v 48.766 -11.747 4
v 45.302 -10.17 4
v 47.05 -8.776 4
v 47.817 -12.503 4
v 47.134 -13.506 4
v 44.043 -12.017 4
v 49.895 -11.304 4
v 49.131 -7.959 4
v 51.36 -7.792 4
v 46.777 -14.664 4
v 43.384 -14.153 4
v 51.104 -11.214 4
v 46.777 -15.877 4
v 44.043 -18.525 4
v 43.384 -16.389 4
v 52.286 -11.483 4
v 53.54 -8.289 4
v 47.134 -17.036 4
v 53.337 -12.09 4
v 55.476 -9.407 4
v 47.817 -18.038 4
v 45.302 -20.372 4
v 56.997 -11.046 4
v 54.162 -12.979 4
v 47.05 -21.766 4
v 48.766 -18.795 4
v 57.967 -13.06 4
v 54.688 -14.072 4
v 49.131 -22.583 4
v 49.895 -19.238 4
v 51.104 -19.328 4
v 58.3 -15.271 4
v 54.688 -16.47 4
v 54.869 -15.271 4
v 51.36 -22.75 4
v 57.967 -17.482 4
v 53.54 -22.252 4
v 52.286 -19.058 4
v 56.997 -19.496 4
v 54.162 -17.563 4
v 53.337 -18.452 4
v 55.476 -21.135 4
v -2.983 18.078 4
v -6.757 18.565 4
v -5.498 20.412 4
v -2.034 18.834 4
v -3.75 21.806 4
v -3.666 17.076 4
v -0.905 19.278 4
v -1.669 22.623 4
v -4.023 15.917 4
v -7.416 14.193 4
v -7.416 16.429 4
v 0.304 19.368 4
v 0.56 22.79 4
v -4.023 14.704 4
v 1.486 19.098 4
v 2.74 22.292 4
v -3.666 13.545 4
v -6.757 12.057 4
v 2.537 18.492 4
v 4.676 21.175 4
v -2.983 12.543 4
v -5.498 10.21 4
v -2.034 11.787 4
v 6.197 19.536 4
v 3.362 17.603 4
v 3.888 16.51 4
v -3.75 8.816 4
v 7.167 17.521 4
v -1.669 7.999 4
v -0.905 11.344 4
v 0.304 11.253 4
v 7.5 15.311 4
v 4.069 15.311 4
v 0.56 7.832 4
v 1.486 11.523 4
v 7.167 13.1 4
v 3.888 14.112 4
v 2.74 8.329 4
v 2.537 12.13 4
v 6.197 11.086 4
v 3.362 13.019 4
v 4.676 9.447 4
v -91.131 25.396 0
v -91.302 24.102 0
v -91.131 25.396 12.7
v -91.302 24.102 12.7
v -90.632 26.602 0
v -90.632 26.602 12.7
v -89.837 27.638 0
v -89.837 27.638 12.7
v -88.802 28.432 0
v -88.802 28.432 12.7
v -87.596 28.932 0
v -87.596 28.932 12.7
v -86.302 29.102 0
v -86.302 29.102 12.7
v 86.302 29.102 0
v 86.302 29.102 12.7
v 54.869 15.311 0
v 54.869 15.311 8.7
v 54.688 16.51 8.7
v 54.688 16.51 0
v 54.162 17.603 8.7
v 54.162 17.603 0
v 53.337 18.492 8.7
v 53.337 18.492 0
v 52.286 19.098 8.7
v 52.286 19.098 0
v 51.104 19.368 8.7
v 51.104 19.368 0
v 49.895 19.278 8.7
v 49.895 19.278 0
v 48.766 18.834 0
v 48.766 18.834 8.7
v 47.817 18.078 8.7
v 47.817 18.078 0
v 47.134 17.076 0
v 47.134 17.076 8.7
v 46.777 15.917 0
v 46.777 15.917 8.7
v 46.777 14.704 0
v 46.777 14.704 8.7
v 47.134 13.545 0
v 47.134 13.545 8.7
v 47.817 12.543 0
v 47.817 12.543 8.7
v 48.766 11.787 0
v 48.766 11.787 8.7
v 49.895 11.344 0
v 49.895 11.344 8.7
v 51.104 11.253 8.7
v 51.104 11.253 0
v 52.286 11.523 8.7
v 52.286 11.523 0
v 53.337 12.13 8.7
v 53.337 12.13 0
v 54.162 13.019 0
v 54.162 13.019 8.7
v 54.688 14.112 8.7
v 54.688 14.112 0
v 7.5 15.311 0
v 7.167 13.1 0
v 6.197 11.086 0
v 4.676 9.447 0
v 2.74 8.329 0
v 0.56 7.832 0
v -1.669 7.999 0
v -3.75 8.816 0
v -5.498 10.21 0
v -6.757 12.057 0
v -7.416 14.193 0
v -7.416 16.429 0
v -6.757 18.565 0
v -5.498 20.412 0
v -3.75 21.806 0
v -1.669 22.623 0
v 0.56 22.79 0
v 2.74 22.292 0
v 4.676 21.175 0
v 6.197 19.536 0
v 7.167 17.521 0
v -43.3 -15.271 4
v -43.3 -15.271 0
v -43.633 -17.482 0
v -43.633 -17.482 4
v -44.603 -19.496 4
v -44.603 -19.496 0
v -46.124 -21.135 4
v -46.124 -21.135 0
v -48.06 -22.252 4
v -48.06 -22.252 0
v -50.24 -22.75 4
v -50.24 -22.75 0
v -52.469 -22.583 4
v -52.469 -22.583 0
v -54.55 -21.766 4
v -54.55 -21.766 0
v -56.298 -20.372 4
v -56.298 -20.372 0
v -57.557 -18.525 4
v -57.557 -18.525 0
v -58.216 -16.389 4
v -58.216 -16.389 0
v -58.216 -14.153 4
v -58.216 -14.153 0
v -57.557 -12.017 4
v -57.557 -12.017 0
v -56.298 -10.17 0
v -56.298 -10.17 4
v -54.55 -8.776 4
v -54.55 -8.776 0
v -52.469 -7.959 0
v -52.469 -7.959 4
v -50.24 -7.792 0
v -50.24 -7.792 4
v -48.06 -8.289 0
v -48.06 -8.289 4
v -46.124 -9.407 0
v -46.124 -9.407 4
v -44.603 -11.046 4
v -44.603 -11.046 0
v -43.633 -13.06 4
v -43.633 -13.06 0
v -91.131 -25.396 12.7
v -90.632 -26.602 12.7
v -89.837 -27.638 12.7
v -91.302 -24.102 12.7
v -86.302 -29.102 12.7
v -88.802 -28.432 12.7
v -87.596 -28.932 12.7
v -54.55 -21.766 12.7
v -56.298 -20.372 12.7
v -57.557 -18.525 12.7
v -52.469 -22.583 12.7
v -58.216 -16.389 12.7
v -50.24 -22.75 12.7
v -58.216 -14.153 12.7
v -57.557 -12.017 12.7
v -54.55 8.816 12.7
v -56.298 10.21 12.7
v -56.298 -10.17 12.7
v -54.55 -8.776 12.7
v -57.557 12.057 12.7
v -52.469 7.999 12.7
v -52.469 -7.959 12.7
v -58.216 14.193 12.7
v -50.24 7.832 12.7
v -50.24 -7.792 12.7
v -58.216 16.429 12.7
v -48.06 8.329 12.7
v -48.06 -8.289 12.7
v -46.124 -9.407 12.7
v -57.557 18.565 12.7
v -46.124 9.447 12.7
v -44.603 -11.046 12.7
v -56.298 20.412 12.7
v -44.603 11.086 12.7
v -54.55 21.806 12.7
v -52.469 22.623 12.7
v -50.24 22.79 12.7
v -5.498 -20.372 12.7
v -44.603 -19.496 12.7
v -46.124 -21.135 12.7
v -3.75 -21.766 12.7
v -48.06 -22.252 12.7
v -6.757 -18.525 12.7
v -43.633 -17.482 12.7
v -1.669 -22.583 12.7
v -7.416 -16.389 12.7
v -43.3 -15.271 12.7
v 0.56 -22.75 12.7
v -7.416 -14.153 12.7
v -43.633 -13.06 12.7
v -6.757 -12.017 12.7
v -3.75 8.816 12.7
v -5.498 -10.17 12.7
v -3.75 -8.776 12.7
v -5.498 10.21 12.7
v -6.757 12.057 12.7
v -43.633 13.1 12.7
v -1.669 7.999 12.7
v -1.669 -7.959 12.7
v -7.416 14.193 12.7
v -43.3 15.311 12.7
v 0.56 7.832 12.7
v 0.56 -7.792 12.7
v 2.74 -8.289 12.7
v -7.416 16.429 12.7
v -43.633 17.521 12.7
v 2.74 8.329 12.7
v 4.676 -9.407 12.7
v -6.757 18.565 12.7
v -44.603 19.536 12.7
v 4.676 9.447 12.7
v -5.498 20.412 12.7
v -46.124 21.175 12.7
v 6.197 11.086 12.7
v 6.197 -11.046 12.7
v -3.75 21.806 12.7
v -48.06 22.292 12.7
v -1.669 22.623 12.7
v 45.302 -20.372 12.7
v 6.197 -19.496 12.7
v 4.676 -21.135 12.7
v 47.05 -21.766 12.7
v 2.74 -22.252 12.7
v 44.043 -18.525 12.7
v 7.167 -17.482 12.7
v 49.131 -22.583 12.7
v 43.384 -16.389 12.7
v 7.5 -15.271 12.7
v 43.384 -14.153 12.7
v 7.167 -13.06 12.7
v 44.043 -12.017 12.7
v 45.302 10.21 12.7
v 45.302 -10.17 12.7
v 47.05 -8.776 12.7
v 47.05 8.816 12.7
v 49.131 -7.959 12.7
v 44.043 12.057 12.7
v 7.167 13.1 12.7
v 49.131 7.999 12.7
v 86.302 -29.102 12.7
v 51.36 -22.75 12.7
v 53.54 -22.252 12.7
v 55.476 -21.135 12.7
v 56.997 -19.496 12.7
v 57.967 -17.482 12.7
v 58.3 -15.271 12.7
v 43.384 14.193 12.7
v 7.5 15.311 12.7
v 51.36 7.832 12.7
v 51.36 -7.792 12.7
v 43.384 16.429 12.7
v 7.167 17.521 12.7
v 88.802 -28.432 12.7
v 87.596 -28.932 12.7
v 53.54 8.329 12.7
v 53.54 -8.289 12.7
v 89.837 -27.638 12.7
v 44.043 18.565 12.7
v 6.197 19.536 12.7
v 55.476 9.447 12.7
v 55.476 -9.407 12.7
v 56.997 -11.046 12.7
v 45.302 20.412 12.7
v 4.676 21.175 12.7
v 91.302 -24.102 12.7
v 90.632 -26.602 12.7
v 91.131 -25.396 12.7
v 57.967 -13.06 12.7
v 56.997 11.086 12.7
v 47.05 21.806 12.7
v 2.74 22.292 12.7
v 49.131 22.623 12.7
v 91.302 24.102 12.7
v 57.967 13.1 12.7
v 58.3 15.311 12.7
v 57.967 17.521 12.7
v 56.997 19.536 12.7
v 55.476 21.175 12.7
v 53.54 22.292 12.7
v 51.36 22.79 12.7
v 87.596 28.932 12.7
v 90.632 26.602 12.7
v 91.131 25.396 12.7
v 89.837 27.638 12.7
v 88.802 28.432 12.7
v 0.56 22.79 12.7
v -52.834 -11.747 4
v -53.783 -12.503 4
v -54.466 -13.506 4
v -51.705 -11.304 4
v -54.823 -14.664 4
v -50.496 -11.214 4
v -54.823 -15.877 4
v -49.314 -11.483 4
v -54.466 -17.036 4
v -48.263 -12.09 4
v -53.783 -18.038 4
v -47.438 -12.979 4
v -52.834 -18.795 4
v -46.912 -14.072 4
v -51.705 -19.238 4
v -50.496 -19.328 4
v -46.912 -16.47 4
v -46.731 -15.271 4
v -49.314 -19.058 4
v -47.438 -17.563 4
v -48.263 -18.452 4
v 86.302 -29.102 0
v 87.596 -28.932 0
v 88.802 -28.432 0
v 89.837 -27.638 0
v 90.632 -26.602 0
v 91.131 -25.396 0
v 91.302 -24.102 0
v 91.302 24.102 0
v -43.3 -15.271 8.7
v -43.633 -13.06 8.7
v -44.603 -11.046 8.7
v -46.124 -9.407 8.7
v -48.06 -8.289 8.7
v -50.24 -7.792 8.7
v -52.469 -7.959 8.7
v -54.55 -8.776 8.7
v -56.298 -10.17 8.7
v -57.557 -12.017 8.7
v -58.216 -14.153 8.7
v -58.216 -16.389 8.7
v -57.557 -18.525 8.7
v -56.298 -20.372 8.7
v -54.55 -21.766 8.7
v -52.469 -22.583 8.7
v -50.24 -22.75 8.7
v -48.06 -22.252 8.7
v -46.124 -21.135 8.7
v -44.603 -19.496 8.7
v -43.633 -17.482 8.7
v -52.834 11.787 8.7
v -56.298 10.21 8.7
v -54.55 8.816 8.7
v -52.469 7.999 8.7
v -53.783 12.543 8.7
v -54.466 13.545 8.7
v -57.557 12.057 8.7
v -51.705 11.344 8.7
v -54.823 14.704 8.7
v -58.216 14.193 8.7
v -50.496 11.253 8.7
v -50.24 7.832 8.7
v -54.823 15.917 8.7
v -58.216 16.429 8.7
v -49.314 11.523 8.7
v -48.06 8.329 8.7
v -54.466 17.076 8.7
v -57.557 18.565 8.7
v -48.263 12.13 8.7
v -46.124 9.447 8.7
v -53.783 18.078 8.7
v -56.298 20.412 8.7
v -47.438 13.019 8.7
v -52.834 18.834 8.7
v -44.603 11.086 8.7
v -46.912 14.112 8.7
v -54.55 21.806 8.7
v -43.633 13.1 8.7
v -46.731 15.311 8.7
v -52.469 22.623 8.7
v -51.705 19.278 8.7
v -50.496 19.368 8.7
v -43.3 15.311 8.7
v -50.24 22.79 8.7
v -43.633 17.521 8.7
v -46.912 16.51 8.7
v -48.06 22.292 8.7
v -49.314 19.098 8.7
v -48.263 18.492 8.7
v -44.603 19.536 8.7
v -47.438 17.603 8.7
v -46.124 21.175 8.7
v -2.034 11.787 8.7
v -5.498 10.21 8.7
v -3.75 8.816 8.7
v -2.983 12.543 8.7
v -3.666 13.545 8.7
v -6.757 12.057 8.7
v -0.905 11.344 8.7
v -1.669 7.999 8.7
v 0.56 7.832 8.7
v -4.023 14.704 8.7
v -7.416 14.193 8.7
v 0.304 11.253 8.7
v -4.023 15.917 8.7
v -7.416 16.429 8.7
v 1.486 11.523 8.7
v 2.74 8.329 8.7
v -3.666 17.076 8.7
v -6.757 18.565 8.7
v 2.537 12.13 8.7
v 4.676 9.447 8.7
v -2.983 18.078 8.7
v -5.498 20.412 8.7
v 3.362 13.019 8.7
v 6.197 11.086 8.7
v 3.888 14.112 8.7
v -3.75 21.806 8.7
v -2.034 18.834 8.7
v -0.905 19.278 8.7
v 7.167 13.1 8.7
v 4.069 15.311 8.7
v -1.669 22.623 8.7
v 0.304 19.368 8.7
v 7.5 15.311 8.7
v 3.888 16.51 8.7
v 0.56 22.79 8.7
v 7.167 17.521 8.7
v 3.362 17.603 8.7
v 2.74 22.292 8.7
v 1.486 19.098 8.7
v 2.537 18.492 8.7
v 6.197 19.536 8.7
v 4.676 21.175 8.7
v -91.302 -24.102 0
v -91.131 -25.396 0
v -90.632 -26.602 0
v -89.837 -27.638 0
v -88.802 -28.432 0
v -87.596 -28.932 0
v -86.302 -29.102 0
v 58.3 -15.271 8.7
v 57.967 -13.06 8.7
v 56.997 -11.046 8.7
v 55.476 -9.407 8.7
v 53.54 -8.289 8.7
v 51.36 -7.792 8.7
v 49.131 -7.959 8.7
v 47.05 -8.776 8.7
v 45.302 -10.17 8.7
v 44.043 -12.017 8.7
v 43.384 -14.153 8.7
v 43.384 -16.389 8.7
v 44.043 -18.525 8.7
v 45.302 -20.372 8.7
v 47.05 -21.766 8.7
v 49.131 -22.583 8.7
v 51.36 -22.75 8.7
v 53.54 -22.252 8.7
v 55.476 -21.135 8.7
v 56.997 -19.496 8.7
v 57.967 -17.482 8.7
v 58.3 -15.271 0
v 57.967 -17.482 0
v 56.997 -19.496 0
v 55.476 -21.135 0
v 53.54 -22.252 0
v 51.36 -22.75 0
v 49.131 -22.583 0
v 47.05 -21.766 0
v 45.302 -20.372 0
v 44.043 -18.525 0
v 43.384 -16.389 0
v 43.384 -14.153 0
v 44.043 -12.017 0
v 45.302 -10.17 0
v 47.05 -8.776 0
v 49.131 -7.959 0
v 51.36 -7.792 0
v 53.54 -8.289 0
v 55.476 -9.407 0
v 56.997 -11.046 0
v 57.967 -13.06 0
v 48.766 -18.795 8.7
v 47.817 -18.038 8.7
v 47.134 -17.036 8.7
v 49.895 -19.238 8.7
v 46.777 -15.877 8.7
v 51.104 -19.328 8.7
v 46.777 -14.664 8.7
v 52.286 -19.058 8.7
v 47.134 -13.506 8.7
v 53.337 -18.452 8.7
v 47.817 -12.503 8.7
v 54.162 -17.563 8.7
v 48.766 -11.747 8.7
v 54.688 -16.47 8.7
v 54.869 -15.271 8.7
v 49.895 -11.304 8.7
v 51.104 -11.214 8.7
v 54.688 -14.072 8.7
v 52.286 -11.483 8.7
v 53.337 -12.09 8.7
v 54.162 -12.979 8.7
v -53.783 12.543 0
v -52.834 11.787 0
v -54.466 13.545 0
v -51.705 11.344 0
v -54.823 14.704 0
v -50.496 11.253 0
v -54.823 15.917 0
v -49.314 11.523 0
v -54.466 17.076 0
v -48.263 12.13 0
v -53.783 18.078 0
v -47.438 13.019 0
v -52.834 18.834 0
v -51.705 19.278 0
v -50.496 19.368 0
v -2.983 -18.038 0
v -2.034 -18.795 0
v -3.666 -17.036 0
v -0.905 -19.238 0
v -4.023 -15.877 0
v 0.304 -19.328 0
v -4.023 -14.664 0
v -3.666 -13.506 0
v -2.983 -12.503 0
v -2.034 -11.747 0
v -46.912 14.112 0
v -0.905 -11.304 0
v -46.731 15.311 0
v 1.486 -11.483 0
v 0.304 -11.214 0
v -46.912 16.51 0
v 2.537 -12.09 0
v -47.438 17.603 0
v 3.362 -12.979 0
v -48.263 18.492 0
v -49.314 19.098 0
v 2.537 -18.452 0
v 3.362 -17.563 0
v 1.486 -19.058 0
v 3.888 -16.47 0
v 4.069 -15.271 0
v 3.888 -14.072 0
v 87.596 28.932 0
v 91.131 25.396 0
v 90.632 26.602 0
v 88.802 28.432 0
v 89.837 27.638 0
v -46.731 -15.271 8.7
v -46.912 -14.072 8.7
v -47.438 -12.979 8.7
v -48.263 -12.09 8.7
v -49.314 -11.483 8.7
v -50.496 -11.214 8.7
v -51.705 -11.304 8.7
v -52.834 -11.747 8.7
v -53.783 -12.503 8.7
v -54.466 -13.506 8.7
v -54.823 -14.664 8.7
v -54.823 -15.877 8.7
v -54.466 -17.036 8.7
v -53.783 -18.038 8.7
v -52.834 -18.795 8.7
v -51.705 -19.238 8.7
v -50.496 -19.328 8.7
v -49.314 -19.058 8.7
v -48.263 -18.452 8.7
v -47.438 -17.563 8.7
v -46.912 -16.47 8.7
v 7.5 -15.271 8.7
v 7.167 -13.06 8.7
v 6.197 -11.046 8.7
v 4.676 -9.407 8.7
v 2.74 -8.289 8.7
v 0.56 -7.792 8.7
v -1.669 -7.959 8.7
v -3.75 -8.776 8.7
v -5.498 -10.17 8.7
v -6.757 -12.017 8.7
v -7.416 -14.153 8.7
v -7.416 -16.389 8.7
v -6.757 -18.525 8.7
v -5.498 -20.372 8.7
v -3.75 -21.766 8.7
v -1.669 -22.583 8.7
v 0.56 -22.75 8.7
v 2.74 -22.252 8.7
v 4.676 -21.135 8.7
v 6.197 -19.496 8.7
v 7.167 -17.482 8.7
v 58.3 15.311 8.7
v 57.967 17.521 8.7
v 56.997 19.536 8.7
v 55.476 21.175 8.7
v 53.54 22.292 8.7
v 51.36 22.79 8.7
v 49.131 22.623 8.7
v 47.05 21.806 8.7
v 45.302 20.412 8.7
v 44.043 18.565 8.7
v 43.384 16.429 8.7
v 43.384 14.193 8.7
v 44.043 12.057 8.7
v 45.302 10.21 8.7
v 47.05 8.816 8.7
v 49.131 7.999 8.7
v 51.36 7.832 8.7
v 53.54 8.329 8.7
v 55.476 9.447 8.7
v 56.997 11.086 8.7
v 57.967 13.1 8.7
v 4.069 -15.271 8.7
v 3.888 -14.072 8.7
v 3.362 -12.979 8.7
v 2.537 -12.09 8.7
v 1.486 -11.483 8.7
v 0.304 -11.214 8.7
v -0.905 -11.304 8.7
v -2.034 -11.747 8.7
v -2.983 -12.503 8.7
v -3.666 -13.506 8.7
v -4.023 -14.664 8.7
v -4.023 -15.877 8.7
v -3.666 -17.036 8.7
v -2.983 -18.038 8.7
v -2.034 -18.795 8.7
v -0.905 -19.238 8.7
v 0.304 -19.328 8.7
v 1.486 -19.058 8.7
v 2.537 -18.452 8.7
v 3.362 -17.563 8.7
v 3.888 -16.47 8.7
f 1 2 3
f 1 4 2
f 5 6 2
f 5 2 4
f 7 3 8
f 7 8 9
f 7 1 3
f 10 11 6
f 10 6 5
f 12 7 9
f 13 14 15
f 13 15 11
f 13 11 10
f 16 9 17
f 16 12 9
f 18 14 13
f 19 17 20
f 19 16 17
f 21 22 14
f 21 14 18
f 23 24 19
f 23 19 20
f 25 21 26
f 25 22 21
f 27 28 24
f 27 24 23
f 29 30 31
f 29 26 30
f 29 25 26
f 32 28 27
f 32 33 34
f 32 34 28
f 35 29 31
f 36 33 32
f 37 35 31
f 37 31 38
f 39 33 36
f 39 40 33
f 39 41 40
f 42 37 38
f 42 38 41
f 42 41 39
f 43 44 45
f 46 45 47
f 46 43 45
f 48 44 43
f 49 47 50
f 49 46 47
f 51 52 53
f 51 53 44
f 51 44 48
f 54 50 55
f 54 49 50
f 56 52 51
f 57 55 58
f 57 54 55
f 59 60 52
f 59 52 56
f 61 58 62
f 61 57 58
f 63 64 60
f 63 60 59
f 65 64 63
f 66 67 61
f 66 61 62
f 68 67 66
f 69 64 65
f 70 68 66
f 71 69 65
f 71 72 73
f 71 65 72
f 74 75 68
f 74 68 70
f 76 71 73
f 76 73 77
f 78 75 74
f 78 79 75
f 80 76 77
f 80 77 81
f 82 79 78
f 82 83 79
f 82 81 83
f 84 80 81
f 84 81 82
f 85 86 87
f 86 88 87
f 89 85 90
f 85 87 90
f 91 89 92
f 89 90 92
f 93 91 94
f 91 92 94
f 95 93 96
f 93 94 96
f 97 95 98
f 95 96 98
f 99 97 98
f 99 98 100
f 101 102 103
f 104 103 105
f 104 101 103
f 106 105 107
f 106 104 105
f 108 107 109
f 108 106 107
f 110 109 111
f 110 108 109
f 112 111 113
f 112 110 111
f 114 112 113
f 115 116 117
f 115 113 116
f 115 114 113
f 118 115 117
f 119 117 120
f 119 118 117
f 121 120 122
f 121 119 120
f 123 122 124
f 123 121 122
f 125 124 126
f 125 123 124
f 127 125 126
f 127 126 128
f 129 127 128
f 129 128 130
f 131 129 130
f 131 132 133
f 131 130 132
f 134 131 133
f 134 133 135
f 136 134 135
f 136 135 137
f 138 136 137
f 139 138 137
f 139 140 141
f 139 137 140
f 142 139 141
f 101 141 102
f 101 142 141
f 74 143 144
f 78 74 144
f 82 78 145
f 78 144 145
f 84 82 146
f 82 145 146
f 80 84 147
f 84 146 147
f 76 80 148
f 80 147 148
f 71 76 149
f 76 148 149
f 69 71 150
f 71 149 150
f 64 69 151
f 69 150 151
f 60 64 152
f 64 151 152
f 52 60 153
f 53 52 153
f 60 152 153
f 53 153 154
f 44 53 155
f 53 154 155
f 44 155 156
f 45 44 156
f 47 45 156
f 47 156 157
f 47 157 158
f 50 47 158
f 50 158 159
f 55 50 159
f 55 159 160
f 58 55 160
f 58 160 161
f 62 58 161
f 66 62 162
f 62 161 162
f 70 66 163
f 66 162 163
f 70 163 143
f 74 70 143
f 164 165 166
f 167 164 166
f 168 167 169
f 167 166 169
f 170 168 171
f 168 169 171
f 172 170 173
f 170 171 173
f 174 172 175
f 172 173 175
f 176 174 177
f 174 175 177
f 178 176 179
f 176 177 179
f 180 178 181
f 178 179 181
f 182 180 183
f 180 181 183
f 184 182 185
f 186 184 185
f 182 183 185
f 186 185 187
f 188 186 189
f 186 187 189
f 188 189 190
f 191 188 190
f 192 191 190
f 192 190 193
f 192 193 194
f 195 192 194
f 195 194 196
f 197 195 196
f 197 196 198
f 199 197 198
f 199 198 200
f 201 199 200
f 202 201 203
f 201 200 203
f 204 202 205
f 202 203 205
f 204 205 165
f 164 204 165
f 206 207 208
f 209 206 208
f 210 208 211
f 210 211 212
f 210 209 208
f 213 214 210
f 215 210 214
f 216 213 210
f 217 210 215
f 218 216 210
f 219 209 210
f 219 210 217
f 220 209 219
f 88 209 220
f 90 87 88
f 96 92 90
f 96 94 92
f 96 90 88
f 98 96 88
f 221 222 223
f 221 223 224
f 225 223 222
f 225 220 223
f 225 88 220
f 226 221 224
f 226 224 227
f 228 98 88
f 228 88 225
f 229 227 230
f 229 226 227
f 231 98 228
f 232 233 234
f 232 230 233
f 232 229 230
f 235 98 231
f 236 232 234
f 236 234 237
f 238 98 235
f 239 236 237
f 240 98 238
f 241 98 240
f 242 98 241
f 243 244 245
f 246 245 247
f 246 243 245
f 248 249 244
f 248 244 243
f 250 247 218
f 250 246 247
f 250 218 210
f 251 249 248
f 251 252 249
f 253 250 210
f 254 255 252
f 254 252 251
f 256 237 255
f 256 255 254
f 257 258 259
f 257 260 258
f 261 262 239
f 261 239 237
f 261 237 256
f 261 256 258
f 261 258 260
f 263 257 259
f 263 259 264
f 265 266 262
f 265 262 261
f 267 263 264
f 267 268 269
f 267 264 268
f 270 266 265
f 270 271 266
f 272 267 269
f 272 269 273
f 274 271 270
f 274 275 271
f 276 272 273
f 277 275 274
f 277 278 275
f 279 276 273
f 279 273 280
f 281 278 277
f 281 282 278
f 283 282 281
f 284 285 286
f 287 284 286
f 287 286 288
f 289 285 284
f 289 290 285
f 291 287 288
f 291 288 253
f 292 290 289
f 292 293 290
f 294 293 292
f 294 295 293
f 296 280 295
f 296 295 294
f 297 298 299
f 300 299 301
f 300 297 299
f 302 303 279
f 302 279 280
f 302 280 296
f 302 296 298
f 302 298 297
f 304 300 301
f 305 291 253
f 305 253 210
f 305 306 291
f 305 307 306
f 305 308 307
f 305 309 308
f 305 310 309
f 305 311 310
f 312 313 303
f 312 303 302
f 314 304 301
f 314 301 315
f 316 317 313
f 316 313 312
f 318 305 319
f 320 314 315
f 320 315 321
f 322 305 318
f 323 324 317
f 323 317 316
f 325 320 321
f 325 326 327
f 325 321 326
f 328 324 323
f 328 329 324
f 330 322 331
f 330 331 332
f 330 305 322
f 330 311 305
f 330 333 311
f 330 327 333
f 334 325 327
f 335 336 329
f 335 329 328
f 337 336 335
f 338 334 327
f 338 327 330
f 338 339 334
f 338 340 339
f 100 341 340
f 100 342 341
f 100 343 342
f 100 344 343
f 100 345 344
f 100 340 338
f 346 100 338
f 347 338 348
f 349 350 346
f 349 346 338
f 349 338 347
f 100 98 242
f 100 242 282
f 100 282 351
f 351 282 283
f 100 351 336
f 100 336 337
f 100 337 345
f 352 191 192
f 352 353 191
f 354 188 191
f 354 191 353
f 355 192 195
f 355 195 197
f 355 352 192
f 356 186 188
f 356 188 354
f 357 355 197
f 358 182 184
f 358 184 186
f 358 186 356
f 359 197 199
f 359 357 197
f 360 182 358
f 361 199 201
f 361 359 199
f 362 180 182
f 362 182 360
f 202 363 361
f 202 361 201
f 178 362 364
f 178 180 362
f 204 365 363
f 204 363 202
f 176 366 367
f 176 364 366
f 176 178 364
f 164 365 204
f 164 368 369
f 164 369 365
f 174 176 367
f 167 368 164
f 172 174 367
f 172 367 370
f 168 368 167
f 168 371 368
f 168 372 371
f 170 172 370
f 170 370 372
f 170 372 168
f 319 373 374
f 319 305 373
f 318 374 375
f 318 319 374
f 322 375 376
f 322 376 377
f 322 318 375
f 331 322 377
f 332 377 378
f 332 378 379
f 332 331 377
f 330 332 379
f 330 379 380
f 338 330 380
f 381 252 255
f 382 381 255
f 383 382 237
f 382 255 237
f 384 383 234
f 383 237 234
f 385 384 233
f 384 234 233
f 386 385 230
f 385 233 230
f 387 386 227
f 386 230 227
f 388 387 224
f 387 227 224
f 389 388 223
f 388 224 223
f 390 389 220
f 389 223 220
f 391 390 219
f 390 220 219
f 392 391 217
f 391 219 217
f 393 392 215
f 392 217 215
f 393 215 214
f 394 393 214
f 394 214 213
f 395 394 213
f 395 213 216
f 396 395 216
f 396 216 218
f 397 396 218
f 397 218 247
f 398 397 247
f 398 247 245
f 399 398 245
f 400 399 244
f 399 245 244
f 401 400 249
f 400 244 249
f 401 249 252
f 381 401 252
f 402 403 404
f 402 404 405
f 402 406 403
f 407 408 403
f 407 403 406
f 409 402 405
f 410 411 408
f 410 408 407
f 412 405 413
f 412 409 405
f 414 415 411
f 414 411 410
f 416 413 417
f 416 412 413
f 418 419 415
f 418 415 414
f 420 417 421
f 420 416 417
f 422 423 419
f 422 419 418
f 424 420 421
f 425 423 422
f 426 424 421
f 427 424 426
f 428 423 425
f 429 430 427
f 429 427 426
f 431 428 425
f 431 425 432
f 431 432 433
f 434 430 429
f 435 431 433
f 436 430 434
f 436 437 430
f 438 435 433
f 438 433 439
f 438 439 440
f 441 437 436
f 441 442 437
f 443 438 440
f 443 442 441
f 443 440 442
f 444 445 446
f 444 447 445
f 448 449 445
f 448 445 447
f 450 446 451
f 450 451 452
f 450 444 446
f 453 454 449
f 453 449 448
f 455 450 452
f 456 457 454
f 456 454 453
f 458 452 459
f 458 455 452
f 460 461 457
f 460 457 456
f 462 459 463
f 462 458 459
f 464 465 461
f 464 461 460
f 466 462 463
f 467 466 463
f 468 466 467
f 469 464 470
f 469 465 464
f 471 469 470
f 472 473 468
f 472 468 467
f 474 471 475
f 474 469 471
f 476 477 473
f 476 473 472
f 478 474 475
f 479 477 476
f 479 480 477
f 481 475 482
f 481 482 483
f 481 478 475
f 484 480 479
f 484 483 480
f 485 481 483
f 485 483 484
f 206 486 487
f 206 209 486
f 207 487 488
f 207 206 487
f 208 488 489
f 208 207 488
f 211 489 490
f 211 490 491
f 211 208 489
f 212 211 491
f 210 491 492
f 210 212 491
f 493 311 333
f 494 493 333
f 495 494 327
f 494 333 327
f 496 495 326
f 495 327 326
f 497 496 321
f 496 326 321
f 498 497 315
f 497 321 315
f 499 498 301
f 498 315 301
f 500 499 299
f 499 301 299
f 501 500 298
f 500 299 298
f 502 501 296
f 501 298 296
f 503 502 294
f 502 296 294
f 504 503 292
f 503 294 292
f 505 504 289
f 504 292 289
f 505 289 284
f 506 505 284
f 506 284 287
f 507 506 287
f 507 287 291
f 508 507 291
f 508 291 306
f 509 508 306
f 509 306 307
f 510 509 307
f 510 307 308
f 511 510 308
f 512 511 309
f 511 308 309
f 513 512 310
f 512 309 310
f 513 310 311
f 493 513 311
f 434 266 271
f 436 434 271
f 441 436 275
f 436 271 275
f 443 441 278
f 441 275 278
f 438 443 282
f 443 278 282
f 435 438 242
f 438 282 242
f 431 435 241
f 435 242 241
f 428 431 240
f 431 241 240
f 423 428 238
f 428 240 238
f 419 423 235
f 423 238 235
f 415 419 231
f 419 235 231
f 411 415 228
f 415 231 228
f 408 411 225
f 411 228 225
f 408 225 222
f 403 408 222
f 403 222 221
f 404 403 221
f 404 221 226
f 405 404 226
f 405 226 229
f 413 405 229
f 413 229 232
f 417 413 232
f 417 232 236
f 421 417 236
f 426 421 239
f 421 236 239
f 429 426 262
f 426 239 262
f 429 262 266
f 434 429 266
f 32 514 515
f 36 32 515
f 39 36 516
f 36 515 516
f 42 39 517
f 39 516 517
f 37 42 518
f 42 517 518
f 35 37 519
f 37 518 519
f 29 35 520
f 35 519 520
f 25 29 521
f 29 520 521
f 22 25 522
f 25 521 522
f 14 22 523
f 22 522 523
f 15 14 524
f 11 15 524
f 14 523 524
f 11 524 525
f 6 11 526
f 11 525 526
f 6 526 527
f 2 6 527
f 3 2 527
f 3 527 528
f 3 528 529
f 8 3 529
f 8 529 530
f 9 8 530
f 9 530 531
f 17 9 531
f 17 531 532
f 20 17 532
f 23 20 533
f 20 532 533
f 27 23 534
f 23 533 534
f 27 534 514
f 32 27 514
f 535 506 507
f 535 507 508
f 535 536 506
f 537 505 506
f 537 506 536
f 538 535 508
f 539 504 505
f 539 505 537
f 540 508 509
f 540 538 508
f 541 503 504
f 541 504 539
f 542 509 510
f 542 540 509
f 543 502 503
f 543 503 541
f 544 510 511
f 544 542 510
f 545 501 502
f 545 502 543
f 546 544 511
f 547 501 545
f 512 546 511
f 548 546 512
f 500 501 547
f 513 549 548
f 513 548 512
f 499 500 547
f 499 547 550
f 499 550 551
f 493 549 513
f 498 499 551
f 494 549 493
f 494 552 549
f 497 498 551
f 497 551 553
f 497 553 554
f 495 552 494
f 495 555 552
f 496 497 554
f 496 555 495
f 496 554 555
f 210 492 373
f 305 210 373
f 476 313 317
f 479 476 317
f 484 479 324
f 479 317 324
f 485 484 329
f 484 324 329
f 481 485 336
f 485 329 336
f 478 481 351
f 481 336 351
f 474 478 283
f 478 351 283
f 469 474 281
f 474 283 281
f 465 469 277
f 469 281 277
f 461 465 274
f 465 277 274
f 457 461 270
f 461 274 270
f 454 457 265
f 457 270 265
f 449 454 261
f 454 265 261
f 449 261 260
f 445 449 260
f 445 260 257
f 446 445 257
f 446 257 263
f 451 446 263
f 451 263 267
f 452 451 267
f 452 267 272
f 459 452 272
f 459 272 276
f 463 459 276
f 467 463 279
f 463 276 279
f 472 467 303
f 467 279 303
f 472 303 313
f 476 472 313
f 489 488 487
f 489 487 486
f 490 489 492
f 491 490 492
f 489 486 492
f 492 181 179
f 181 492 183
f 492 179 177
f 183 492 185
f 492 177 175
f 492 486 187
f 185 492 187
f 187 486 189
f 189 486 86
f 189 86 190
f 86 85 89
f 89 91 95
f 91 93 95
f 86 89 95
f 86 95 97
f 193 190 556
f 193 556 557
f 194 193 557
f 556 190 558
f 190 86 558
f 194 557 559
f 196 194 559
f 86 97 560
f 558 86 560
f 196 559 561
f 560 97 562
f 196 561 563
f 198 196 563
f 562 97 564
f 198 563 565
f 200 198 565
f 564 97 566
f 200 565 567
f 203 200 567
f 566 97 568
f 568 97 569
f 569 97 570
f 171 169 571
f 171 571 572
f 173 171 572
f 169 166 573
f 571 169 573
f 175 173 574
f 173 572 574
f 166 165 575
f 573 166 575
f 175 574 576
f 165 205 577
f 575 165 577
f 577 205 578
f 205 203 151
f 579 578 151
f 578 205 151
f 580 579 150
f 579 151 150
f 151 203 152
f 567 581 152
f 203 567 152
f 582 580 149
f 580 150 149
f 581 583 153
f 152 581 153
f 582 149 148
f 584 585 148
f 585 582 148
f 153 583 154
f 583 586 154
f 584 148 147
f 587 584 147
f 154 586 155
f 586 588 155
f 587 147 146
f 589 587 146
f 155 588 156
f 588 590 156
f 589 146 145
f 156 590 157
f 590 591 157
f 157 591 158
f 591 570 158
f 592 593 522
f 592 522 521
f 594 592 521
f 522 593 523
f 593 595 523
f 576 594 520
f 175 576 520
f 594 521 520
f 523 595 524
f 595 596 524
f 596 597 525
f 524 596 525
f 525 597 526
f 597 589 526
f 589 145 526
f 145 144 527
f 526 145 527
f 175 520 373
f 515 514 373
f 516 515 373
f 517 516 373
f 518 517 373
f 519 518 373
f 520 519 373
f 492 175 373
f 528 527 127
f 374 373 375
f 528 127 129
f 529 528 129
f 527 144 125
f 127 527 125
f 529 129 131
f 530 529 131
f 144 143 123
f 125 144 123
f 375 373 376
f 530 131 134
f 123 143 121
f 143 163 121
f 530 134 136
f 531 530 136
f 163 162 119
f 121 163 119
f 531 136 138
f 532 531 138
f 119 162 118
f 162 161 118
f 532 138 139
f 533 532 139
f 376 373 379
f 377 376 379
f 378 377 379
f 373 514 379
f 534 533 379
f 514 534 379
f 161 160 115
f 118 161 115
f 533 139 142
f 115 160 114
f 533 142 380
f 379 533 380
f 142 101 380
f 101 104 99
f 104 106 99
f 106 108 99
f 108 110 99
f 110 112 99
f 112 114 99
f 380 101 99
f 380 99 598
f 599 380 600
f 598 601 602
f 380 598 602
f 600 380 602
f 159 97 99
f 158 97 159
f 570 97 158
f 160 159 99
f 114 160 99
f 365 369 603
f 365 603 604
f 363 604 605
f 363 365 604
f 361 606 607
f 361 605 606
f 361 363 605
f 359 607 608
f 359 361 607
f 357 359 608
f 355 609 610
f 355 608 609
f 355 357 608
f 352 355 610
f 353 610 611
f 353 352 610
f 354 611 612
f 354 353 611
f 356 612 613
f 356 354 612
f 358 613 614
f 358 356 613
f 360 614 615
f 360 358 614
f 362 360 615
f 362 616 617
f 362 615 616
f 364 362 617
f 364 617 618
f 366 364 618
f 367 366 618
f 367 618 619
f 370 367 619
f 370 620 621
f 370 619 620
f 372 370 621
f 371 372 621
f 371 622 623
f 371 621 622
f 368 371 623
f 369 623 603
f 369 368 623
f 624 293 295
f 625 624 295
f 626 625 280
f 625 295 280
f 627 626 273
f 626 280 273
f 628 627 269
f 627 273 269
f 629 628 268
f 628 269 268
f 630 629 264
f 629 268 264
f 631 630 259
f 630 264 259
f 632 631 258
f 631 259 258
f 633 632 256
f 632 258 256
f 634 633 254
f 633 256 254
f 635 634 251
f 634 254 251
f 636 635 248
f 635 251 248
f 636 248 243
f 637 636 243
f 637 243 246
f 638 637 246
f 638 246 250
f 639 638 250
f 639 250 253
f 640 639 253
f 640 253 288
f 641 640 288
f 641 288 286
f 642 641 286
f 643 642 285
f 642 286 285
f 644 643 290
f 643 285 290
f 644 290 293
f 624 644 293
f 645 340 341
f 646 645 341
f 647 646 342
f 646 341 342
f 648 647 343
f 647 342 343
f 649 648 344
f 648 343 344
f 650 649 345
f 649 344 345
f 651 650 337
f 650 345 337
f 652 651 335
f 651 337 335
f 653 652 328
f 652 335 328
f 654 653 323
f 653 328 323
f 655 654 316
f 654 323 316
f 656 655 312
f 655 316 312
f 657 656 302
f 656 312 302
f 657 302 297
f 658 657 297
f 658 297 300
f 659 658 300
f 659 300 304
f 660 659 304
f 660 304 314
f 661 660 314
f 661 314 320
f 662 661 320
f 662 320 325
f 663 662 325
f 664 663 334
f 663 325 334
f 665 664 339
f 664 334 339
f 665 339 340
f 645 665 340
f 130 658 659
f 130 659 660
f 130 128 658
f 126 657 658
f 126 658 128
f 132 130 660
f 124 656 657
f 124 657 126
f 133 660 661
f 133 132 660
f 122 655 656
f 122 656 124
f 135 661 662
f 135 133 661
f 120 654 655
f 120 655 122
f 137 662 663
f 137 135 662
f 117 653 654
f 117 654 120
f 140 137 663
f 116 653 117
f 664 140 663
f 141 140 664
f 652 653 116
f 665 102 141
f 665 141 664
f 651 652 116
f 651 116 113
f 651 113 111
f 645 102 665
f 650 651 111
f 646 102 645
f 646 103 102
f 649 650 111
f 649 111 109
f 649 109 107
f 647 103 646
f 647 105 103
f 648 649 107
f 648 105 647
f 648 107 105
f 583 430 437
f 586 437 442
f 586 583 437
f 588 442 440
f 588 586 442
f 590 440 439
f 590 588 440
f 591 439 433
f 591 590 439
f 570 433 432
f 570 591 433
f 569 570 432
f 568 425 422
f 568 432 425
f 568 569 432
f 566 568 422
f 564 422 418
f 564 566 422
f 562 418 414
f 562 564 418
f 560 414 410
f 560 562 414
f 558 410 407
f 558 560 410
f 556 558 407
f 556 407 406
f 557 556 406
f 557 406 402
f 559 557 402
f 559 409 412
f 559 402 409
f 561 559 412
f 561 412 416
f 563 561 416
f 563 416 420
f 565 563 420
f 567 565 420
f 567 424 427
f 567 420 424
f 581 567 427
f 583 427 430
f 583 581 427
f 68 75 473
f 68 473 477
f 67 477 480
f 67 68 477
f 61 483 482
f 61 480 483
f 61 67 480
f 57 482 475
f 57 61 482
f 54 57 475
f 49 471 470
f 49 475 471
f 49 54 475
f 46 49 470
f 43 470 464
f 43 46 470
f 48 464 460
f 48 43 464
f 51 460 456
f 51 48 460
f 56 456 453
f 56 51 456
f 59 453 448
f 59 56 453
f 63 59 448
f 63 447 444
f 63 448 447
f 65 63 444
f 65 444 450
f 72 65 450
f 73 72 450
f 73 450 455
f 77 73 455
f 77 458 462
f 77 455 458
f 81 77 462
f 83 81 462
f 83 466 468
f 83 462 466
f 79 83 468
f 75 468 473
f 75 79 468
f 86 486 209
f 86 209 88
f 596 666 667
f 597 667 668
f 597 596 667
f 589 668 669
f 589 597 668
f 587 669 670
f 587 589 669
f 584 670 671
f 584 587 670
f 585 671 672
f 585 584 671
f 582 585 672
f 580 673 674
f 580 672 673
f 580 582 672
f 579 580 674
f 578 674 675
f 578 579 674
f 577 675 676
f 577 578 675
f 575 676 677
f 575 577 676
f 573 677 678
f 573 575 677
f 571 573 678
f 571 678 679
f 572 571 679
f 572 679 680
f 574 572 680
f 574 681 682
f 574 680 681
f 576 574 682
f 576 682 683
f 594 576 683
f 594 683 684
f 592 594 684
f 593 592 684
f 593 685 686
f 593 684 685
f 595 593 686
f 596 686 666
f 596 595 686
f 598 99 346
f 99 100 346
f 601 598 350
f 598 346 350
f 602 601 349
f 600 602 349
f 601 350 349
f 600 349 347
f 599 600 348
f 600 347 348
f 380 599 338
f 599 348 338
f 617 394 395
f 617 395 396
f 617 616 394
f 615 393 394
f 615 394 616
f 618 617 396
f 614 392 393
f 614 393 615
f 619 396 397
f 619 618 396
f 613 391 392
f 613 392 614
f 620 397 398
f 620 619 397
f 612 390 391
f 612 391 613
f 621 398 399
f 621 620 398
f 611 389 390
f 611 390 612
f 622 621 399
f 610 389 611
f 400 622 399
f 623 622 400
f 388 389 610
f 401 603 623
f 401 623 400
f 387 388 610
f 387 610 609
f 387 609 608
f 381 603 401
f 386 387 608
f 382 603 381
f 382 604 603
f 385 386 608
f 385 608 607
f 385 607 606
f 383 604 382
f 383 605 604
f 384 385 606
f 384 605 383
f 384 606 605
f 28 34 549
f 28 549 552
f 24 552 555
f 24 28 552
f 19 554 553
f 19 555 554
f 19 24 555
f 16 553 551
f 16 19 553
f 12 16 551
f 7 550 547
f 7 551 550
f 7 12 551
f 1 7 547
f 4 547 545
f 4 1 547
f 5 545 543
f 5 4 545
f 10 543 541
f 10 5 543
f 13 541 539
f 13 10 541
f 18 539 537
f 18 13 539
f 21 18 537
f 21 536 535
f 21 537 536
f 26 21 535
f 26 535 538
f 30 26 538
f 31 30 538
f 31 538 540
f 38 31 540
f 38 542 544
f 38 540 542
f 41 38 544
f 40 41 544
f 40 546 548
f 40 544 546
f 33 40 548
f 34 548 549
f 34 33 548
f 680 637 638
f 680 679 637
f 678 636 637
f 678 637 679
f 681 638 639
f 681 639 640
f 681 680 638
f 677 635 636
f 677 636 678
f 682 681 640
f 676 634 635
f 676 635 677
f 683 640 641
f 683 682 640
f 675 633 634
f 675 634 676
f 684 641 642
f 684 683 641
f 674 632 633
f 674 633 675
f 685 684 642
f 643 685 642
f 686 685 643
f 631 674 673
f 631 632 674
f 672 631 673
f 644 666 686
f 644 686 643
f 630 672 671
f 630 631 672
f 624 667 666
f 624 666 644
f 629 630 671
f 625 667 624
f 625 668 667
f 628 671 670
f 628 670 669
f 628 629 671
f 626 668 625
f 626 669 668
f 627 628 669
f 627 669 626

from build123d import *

# Parameters (mm, degrees)
F1_W     = 182.603597641
F1_H     = 58.2040771842
F3_DEPTH = 12.7
F2_R     = 4.06875
F4_DEPTH = 12.701
F5_R     = 7.5
F6_DEPTH = 4
F7_R     = 7.5
F8_DEPTH = 4
F9_R     = 5


with BuildPart() as f3:
    # F1 (on Top) → F3 (new body)
    with BuildSketch(Plane.XY):
        Rectangle(F1_W, F1_H)
    extrude(amount=F3_DEPTH)

    # F2 (on Top) → F4 (cut, through all)
    with BuildSketch(Plane.XY):
        with Locations((-50.8, 15.3108183295)):
            Circle(F2_R)
        with Locations((0, 15.3108183295)):
            Circle(F2_R)
        with Locations((50.8, 15.3108183295)):
            Circle(F2_R)
        with Locations((50.8, -15.2709130198)):
            Circle(F2_R)
        with Locations((0, -15.2709130198)):
            Circle(F2_R)
        with Locations((-50.8, -15.2709130198)):
            Circle(F2_R)
    extrude(amount=F4_DEPTH, mode=Mode.SUBTRACT)

    # F5 (on face) → F6 (cut)
    with BuildSketch(Plane.XY.offset(12.7)):
        with Locations((-50.8, 15.3108183295)):
            Circle(F5_R)
        with Locations((0, -15.2709130198)):
            Circle(F5_R)
        with Locations((50.8, 15.3108183295)):
            Circle(F5_R)
        with Locations((-50.8, -15.2709130198)):
            Circle(F5_R)
        with Locations((0, 15.3108183295)):
            Circle(F5_R)
        with Locations((50.8, -15.2709130198)):
            Circle(F5_R)
    extrude(amount=-F6_DEPTH, mode=Mode.SUBTRACT)

    # F7 (on face) → F8 (cut)
    with BuildSketch(Plane(origin=(0, 0, 0), x_dir=(1, 0, 0), z_dir=(0, 0, -1))):
        with Locations((0, -15.3108183295)):
            Circle(F7_R)
        with Locations((-50.8, 15.2709130198)):
            Circle(F7_R)
        with Locations((50.8, 15.2709130198)):
            Circle(F7_R)
    extrude(amount=-F8_DEPTH, mode=Mode.SUBTRACT)

    # F9
    f9_edges = [f3.edges().sort_by_distance(p)[0] for p in [
        (-91.301799, -29.102039, 6.35),
        (-91.301799, 29.102039, 6.35),
        (91.301799, 29.102039, 6.35),
        (91.301799, -29.102039, 6.35),
    ]]
    fillet(f9_edges, radius=F9_R)


solid = f3.part
